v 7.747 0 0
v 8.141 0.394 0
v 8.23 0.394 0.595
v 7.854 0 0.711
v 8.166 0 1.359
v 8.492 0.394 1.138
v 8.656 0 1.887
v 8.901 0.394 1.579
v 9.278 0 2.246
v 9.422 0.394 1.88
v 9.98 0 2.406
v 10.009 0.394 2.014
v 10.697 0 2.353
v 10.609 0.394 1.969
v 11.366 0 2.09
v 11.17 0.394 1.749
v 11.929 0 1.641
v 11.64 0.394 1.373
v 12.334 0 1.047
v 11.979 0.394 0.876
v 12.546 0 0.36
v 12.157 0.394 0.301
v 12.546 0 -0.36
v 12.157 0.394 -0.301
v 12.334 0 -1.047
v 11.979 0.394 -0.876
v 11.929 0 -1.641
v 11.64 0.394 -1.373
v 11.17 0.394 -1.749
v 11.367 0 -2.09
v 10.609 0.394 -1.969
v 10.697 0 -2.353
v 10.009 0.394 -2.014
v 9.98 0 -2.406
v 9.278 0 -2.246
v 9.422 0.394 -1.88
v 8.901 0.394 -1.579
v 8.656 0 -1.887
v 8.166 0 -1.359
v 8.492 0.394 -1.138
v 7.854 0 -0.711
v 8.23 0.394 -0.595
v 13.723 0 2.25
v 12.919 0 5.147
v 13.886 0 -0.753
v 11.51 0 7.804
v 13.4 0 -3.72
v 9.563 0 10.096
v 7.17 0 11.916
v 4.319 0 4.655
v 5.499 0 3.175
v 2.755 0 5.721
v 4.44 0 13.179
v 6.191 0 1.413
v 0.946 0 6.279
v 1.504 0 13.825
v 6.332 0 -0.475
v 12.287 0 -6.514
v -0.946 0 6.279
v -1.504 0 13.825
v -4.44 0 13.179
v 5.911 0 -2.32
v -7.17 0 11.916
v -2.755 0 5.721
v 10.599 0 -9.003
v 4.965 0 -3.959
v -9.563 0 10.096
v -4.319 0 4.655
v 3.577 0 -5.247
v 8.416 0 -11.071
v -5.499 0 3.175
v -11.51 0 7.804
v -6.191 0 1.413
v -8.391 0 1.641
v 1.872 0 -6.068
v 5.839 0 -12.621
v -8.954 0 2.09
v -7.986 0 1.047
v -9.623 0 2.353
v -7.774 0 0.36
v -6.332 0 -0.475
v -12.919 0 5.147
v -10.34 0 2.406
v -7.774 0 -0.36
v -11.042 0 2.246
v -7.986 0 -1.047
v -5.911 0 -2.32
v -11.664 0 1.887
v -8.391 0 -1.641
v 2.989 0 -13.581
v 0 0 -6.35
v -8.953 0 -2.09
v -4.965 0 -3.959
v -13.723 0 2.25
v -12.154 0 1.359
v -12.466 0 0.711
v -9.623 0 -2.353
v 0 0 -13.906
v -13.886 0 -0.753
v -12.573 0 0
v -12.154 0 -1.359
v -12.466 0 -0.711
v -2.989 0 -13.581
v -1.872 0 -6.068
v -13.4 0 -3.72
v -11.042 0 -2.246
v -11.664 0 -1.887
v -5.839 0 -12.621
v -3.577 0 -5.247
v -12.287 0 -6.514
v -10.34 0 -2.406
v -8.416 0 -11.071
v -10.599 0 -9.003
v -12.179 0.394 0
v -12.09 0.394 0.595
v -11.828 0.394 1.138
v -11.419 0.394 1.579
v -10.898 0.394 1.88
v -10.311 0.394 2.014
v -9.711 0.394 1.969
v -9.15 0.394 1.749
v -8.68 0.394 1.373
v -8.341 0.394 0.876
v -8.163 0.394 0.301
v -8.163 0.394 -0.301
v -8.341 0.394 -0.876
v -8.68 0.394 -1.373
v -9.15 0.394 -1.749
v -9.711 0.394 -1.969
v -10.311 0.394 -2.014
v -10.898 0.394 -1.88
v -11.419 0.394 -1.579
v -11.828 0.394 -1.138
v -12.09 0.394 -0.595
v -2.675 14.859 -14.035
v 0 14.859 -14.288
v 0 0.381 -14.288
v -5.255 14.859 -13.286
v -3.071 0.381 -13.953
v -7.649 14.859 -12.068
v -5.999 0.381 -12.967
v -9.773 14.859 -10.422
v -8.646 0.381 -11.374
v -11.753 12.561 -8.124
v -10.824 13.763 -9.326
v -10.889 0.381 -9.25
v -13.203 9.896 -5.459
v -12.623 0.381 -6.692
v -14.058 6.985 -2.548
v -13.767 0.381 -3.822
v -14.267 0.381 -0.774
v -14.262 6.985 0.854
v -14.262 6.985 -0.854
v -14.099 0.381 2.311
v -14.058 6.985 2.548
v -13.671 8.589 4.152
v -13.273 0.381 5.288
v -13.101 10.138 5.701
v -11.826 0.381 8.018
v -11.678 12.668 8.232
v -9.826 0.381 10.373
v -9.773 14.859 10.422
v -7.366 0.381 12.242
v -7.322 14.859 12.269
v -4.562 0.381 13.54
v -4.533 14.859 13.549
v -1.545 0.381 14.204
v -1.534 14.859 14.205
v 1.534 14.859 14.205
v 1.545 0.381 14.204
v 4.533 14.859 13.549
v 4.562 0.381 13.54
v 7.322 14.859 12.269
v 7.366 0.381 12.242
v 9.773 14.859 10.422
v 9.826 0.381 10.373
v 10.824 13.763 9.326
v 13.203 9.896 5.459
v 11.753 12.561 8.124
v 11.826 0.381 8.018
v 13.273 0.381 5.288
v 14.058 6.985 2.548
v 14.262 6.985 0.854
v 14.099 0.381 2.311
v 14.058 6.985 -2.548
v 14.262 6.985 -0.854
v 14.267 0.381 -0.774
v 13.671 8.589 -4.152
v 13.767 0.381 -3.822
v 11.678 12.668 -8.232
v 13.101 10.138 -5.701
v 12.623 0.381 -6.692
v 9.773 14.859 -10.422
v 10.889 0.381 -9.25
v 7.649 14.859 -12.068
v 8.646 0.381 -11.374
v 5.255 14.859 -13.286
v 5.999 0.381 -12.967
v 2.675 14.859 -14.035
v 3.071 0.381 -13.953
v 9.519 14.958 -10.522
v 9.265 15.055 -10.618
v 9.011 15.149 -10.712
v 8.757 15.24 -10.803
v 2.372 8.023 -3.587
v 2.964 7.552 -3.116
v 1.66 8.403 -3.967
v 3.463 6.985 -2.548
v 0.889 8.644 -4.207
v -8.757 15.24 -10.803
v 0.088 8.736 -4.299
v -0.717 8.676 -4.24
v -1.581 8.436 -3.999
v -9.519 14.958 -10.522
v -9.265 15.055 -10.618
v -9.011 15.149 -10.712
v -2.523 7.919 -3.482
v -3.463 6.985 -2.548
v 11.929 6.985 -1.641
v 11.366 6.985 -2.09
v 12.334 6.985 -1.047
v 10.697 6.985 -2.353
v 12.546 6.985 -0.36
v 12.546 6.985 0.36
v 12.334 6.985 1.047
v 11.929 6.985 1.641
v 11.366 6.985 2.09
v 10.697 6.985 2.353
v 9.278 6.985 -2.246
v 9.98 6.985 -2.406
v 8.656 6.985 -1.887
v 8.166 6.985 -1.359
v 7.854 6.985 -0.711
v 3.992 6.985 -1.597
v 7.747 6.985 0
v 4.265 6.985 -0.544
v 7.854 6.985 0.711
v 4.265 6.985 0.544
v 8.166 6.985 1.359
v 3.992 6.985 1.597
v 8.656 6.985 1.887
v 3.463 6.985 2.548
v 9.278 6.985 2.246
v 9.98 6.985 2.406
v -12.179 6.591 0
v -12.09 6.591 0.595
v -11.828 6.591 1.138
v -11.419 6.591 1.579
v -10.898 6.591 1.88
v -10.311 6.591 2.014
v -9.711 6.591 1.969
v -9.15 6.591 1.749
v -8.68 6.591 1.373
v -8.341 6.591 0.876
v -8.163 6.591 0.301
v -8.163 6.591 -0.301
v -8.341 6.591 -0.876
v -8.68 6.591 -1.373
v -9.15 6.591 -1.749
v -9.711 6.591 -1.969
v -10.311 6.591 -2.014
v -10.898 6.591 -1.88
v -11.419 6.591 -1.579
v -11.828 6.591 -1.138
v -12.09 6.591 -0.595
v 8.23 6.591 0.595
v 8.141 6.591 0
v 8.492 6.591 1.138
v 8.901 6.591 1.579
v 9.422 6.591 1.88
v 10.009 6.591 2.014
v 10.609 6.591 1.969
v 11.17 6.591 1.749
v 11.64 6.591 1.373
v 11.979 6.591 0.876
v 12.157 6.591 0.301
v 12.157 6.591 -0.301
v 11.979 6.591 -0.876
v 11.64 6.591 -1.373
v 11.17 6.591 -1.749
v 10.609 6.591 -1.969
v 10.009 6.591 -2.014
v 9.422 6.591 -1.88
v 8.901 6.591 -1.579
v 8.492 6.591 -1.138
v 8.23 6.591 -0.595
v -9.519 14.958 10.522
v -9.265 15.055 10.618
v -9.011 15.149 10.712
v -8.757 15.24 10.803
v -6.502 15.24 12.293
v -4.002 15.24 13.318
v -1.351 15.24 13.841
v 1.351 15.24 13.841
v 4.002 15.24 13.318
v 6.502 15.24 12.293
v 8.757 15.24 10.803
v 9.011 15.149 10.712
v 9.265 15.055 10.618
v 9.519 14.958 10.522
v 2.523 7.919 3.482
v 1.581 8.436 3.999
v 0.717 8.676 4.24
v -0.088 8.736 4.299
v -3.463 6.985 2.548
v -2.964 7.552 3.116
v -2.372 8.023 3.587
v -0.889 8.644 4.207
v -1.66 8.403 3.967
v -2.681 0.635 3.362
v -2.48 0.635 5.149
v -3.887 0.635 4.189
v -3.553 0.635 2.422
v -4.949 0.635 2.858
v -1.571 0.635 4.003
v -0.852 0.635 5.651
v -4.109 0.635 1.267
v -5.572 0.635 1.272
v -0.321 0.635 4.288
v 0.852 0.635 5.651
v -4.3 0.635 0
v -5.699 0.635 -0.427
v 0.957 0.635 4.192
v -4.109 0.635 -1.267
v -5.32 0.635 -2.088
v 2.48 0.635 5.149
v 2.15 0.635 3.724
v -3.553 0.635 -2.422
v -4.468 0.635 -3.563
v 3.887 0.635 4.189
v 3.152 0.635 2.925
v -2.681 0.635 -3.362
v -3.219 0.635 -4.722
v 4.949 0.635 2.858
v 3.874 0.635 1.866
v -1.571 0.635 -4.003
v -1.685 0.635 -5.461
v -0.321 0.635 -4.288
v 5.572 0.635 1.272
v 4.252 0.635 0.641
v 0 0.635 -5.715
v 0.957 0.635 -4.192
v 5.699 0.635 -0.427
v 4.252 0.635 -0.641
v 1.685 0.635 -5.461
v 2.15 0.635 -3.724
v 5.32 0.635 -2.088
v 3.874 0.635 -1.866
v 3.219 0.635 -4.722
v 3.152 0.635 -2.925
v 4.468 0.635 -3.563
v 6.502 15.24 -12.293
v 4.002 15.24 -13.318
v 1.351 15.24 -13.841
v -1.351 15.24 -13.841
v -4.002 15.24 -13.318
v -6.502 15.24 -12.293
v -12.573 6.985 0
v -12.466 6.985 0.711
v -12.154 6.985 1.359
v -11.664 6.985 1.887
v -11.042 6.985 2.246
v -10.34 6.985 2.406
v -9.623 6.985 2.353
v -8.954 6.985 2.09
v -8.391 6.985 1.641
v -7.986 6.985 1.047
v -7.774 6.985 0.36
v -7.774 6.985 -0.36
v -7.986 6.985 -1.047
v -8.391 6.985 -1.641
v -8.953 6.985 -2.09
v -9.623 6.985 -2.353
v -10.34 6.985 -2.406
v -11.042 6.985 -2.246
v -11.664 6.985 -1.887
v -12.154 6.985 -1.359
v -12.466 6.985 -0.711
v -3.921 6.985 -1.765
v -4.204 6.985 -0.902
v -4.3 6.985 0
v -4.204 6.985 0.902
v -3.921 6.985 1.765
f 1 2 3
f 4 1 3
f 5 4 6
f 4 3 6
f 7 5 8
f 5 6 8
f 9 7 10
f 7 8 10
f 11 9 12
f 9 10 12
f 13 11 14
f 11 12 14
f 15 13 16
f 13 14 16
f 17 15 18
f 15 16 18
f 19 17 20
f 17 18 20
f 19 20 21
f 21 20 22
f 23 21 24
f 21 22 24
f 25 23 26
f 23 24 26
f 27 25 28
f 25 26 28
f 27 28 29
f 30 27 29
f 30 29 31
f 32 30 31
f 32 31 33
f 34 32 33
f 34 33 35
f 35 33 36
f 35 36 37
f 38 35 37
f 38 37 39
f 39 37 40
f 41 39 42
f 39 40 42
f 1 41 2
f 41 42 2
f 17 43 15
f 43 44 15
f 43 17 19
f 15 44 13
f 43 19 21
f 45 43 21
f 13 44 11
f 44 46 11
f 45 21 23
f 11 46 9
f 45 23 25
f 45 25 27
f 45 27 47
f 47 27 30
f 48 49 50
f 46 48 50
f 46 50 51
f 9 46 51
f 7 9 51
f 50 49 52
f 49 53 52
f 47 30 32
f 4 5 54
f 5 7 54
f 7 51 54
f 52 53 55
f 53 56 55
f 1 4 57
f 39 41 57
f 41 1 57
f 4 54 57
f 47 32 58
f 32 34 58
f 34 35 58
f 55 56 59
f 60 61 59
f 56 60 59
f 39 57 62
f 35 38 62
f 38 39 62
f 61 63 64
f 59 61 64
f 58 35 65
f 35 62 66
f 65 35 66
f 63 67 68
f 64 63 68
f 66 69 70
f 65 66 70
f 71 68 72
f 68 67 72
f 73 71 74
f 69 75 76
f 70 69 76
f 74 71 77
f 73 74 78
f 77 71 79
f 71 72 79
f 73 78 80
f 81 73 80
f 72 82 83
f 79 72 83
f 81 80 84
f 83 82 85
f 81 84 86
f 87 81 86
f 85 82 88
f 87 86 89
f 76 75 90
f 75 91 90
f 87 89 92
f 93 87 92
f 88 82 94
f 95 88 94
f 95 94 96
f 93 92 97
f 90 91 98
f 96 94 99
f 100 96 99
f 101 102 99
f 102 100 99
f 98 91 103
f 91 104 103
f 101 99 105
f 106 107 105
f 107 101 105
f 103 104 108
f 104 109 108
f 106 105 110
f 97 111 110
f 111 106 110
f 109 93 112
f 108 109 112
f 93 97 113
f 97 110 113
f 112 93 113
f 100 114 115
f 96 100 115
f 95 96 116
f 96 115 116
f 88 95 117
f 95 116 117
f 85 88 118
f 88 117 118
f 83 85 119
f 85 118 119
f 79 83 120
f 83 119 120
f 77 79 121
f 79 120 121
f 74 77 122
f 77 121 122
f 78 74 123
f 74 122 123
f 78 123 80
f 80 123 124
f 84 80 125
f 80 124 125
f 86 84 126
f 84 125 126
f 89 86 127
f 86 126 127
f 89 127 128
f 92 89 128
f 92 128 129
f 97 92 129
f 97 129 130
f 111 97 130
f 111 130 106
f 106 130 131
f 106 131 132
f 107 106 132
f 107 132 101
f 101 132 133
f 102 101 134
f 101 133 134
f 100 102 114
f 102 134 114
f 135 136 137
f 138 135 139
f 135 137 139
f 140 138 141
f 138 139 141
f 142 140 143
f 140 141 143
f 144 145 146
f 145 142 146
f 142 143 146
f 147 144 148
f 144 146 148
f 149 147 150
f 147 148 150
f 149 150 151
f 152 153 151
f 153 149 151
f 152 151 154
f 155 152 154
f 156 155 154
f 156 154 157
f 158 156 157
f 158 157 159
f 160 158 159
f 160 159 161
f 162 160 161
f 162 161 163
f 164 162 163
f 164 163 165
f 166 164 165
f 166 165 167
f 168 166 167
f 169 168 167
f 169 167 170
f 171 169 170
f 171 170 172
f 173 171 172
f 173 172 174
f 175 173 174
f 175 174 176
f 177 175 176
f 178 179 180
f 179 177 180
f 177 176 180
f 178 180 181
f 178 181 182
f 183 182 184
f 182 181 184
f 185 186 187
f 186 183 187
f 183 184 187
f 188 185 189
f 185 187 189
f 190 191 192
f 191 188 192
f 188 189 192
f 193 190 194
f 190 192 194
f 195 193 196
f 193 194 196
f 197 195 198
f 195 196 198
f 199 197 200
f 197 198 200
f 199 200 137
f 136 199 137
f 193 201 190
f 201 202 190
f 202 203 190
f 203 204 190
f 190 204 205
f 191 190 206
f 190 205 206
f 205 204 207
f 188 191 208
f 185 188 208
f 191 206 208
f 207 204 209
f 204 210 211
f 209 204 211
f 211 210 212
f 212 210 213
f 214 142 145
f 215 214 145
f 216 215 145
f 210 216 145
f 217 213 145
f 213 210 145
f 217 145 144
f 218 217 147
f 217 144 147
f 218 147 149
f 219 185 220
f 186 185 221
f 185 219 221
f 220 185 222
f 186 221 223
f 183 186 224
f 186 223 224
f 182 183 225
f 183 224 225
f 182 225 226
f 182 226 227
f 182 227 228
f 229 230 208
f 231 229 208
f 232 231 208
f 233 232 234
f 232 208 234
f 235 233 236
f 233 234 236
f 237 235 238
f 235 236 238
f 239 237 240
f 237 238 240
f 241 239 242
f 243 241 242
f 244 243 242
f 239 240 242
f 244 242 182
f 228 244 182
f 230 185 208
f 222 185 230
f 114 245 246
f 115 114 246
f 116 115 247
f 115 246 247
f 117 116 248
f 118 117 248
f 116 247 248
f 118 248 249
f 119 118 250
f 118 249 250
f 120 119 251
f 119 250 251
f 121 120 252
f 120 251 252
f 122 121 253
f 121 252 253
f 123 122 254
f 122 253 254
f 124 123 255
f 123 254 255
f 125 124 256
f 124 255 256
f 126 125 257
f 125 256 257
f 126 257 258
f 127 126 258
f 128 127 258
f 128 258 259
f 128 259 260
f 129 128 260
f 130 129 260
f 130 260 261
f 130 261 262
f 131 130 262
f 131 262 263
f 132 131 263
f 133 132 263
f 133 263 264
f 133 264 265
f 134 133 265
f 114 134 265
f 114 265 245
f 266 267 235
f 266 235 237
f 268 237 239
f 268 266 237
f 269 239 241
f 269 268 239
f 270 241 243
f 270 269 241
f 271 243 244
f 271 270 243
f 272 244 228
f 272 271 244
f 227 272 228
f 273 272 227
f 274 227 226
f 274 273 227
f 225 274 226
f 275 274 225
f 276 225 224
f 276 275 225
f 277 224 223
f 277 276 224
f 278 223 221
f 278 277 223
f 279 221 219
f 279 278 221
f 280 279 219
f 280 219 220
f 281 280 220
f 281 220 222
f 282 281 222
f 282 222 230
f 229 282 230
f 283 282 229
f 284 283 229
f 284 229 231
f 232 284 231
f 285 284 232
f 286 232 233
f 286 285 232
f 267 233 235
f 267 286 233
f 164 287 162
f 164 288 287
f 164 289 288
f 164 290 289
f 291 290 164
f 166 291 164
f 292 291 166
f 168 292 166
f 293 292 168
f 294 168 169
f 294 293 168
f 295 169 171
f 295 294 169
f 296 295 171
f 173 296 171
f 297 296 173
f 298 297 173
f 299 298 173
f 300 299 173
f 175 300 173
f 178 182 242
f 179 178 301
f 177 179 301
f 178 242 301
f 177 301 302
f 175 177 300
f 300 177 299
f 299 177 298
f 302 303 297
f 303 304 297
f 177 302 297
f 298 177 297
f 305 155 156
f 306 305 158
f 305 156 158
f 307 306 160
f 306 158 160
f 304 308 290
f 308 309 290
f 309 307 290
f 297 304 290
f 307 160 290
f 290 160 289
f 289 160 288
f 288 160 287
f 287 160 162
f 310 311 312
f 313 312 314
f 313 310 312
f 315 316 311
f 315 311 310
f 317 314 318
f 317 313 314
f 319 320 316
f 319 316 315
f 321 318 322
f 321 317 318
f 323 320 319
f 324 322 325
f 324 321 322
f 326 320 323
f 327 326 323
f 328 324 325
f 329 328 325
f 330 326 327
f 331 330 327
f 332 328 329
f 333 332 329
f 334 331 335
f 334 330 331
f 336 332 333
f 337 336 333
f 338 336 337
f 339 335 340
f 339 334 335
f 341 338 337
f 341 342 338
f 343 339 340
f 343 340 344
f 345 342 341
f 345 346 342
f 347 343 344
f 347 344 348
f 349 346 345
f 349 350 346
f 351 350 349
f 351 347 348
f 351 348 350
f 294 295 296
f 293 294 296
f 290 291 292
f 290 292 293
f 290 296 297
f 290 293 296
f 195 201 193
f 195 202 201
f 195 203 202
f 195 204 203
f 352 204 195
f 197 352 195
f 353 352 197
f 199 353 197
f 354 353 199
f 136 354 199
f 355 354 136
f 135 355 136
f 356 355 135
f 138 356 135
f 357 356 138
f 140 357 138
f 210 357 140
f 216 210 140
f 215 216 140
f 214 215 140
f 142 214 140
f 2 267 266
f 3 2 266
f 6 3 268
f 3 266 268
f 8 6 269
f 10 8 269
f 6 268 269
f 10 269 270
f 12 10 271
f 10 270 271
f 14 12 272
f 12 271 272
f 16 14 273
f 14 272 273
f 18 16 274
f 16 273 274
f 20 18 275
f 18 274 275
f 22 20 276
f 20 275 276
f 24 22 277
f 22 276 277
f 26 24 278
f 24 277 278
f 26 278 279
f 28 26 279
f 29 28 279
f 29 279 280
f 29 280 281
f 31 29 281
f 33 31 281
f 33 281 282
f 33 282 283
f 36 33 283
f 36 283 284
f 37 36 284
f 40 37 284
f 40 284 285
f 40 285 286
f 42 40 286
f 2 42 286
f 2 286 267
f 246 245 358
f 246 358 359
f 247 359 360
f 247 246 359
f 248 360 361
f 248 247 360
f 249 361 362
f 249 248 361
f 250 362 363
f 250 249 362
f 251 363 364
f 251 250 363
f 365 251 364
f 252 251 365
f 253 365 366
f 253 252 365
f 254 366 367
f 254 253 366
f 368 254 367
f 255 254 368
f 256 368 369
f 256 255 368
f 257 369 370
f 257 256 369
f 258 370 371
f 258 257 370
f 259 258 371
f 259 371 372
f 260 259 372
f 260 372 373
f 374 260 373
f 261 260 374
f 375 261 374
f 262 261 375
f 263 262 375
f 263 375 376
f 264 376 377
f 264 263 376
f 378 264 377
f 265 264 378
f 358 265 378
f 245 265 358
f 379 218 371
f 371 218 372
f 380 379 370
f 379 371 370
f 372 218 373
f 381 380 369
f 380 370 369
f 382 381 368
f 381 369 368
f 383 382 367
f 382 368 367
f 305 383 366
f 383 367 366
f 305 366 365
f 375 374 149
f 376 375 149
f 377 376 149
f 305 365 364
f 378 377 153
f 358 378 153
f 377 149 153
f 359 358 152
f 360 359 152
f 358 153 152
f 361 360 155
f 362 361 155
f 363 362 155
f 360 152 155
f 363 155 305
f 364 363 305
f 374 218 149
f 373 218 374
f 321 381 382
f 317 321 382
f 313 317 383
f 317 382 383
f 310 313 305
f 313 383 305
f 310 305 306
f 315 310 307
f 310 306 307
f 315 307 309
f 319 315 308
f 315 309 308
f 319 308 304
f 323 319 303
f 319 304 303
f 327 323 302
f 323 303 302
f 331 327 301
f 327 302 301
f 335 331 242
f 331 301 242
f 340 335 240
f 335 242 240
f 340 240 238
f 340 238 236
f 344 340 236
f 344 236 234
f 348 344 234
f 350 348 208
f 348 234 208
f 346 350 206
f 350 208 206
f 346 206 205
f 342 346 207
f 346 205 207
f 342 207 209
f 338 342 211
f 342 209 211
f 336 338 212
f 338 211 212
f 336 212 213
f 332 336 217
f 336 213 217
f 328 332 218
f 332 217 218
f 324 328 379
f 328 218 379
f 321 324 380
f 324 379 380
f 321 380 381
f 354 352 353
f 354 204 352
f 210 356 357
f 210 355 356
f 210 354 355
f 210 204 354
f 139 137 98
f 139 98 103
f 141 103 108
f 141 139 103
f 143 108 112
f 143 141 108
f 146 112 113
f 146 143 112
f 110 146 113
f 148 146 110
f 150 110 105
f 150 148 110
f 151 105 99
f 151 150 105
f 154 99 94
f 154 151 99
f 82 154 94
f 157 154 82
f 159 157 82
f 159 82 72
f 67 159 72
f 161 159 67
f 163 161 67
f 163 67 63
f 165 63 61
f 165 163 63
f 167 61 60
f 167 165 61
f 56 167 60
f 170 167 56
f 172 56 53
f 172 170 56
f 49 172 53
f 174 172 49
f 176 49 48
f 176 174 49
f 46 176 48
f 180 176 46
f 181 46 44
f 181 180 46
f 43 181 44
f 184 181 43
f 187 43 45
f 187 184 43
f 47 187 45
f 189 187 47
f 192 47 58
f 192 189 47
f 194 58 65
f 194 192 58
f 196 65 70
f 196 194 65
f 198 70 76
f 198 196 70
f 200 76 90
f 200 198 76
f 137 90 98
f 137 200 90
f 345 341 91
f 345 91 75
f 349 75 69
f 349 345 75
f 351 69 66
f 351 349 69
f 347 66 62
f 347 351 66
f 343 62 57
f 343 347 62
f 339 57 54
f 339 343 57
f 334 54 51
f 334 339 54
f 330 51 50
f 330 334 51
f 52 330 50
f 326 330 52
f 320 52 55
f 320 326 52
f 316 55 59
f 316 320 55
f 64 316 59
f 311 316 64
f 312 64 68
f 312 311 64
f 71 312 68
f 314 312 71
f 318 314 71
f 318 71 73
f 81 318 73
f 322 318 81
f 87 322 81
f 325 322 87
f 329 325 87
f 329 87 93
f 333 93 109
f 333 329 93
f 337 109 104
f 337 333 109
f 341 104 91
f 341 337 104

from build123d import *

# Parameters (mm, degrees)
SKETCH1_R                      = 14.2875
EXTRUDE1_DEPTH                 = 15.24
CUT_EXTRUDE1_DEPTH             = 26.308554137
CUT_EXTRUDE1_DEPTH_BACK        = 26.308554137
TAP_DRILL_FOR_10_TAP1_D        = 4.0386
CHAMFER1_SIZE                  = 0.3937
SKETCH6_R                      = 6.35
CUT_EXTRUDE2_DEPTH             = 0.635
CHAMFER2_SIZE                  = 0.635
CHAMFER3_SIZE                  = 0.381
F_8_6_8_6_DIAMETER_HOLE1_D     = 8.6
F_8_6_8_6_DIAMETER_HOLE1_DEPTH = 15.24
F_8_6_8_6_DIAMETER_HOLE1_TIP   = 2.583700662


with BuildPart() as part:
    # Sketch1 → Extrude1 (new body)
    with BuildSketch(Plane(origin=(0, 0, 0), x_dir=(1, 0, 0), z_dir=(0, 1, 0))):
        with Locations(Location((0, 0, 0), (0, 0, 90))):
            Circle(SKETCH1_R)
    extrude(amount=EXTRUDE1_DEPTH)

    # Sketch3 → Cut-Extrude1 (cut, two sides: drawn at the far end of the back side and taken through both)
    with BuildSketch(Plane(origin=(0, 0, 0), x_dir=(0, 0, -1), z_dir=(1, 0, 0)).offset(-CUT_EXTRUDE1_DEPTH_BACK)):
        Polygon((-10.803384182, 15.24), (10.803384182, 15.24), (2.548384182, 6.985), (-2.548384182, 6.985), align=None)
    extrude(amount=CUT_EXTRUDE1_DEPTH + CUT_EXTRUDE1_DEPTH_BACK, mode=Mode.SUBTRACT)

    # Tap Drill for #10 Tap1 (through all)
    with Locations(Plane.XZ):
        with Locations((-10.16, 0), (10.16, 0)):
            Hole(TAP_DRILL_FOR_10_TAP1_D / 2)

    # Chamfer1
    chamfer1_edges = [part.edges().sort_by_distance(p)[0] for p in [
        (12.1793, 6.985, 0),
        (12.1793, 0, 0),
        (-8.1407, 6.985, 0),
        (-8.1407, 0, 0),
    ]]
    chamfer(chamfer1_edges, length=CHAMFER1_SIZE)

    # Sketch6 → Cut-Extrude2 (cut)
    with BuildSketch(Plane.XZ):
        with Locations(Location((0, 0, 0), (0, 0, 270))):
            Circle(SKETCH6_R)
    extrude(amount=-CUT_EXTRUDE2_DEPTH, mode=Mode.SUBTRACT)

    # Chamfer2
    chamfer2_edges = [part.edges().sort_by_distance(p)[0] for p in [
        (0, 0.635, 6.35),
    ]]
    chamfer(chamfer2_edges, length=CHAMFER2_SIZE - 0.0001)  # a hair under: the kernel refuses the full size

    # Sketch9 → Cut-Revolve1 (revolve, cut)
    with BuildSketch(Plane.XY, mode=Mode.PRIVATE) as cut_revolve1_sk:
        Polygon((2.032, 6.985), (1.5875, 6.5405), (1.5875, 0.9525), (1.905, 0.635), (0, 0.635), (0, 6.985), align=None)
    revolve(cut_revolve1_sk.sketch.rotate(Axis((0, 0, 0), (0, 1, 0)), 90), axis=Axis((0, 0, 0), (0, 1, 0)), mode=Mode.SUBTRACT)

    # Chamfer3
    chamfer3_edges = [part.edges().sort_by_distance(p)[0] for p in [
        (0, 0, 14.2875),
        (4.988953034, 15.24, -13.388166561),
        (0, 15.24, 14.2875),
    ]]
    chamfer(chamfer3_edges, length=CHAMFER3_SIZE)

    # Ø8.6 (8.6) Diameter Hole1
    with Locations(Plane.XZ.offset(-0.635)):
        with Locations((0, 0)):
            Hole(F_8_6_8_6_DIAMETER_HOLE1_D / 2, depth=F_8_6_8_6_DIAMETER_HOLE1_DEPTH)
            with Locations((0, 0, -(F_8_6_8_6_DIAMETER_HOLE1_DEPTH + F_8_6_8_6_DIAMETER_HOLE1_TIP / 2))):  # 118° drill point
                Cone(0, F_8_6_8_6_DIAMETER_HOLE1_D / 2, F_8_6_8_6_DIAMETER_HOLE1_TIP, mode=Mode.SUBTRACT)


solid = part.part
